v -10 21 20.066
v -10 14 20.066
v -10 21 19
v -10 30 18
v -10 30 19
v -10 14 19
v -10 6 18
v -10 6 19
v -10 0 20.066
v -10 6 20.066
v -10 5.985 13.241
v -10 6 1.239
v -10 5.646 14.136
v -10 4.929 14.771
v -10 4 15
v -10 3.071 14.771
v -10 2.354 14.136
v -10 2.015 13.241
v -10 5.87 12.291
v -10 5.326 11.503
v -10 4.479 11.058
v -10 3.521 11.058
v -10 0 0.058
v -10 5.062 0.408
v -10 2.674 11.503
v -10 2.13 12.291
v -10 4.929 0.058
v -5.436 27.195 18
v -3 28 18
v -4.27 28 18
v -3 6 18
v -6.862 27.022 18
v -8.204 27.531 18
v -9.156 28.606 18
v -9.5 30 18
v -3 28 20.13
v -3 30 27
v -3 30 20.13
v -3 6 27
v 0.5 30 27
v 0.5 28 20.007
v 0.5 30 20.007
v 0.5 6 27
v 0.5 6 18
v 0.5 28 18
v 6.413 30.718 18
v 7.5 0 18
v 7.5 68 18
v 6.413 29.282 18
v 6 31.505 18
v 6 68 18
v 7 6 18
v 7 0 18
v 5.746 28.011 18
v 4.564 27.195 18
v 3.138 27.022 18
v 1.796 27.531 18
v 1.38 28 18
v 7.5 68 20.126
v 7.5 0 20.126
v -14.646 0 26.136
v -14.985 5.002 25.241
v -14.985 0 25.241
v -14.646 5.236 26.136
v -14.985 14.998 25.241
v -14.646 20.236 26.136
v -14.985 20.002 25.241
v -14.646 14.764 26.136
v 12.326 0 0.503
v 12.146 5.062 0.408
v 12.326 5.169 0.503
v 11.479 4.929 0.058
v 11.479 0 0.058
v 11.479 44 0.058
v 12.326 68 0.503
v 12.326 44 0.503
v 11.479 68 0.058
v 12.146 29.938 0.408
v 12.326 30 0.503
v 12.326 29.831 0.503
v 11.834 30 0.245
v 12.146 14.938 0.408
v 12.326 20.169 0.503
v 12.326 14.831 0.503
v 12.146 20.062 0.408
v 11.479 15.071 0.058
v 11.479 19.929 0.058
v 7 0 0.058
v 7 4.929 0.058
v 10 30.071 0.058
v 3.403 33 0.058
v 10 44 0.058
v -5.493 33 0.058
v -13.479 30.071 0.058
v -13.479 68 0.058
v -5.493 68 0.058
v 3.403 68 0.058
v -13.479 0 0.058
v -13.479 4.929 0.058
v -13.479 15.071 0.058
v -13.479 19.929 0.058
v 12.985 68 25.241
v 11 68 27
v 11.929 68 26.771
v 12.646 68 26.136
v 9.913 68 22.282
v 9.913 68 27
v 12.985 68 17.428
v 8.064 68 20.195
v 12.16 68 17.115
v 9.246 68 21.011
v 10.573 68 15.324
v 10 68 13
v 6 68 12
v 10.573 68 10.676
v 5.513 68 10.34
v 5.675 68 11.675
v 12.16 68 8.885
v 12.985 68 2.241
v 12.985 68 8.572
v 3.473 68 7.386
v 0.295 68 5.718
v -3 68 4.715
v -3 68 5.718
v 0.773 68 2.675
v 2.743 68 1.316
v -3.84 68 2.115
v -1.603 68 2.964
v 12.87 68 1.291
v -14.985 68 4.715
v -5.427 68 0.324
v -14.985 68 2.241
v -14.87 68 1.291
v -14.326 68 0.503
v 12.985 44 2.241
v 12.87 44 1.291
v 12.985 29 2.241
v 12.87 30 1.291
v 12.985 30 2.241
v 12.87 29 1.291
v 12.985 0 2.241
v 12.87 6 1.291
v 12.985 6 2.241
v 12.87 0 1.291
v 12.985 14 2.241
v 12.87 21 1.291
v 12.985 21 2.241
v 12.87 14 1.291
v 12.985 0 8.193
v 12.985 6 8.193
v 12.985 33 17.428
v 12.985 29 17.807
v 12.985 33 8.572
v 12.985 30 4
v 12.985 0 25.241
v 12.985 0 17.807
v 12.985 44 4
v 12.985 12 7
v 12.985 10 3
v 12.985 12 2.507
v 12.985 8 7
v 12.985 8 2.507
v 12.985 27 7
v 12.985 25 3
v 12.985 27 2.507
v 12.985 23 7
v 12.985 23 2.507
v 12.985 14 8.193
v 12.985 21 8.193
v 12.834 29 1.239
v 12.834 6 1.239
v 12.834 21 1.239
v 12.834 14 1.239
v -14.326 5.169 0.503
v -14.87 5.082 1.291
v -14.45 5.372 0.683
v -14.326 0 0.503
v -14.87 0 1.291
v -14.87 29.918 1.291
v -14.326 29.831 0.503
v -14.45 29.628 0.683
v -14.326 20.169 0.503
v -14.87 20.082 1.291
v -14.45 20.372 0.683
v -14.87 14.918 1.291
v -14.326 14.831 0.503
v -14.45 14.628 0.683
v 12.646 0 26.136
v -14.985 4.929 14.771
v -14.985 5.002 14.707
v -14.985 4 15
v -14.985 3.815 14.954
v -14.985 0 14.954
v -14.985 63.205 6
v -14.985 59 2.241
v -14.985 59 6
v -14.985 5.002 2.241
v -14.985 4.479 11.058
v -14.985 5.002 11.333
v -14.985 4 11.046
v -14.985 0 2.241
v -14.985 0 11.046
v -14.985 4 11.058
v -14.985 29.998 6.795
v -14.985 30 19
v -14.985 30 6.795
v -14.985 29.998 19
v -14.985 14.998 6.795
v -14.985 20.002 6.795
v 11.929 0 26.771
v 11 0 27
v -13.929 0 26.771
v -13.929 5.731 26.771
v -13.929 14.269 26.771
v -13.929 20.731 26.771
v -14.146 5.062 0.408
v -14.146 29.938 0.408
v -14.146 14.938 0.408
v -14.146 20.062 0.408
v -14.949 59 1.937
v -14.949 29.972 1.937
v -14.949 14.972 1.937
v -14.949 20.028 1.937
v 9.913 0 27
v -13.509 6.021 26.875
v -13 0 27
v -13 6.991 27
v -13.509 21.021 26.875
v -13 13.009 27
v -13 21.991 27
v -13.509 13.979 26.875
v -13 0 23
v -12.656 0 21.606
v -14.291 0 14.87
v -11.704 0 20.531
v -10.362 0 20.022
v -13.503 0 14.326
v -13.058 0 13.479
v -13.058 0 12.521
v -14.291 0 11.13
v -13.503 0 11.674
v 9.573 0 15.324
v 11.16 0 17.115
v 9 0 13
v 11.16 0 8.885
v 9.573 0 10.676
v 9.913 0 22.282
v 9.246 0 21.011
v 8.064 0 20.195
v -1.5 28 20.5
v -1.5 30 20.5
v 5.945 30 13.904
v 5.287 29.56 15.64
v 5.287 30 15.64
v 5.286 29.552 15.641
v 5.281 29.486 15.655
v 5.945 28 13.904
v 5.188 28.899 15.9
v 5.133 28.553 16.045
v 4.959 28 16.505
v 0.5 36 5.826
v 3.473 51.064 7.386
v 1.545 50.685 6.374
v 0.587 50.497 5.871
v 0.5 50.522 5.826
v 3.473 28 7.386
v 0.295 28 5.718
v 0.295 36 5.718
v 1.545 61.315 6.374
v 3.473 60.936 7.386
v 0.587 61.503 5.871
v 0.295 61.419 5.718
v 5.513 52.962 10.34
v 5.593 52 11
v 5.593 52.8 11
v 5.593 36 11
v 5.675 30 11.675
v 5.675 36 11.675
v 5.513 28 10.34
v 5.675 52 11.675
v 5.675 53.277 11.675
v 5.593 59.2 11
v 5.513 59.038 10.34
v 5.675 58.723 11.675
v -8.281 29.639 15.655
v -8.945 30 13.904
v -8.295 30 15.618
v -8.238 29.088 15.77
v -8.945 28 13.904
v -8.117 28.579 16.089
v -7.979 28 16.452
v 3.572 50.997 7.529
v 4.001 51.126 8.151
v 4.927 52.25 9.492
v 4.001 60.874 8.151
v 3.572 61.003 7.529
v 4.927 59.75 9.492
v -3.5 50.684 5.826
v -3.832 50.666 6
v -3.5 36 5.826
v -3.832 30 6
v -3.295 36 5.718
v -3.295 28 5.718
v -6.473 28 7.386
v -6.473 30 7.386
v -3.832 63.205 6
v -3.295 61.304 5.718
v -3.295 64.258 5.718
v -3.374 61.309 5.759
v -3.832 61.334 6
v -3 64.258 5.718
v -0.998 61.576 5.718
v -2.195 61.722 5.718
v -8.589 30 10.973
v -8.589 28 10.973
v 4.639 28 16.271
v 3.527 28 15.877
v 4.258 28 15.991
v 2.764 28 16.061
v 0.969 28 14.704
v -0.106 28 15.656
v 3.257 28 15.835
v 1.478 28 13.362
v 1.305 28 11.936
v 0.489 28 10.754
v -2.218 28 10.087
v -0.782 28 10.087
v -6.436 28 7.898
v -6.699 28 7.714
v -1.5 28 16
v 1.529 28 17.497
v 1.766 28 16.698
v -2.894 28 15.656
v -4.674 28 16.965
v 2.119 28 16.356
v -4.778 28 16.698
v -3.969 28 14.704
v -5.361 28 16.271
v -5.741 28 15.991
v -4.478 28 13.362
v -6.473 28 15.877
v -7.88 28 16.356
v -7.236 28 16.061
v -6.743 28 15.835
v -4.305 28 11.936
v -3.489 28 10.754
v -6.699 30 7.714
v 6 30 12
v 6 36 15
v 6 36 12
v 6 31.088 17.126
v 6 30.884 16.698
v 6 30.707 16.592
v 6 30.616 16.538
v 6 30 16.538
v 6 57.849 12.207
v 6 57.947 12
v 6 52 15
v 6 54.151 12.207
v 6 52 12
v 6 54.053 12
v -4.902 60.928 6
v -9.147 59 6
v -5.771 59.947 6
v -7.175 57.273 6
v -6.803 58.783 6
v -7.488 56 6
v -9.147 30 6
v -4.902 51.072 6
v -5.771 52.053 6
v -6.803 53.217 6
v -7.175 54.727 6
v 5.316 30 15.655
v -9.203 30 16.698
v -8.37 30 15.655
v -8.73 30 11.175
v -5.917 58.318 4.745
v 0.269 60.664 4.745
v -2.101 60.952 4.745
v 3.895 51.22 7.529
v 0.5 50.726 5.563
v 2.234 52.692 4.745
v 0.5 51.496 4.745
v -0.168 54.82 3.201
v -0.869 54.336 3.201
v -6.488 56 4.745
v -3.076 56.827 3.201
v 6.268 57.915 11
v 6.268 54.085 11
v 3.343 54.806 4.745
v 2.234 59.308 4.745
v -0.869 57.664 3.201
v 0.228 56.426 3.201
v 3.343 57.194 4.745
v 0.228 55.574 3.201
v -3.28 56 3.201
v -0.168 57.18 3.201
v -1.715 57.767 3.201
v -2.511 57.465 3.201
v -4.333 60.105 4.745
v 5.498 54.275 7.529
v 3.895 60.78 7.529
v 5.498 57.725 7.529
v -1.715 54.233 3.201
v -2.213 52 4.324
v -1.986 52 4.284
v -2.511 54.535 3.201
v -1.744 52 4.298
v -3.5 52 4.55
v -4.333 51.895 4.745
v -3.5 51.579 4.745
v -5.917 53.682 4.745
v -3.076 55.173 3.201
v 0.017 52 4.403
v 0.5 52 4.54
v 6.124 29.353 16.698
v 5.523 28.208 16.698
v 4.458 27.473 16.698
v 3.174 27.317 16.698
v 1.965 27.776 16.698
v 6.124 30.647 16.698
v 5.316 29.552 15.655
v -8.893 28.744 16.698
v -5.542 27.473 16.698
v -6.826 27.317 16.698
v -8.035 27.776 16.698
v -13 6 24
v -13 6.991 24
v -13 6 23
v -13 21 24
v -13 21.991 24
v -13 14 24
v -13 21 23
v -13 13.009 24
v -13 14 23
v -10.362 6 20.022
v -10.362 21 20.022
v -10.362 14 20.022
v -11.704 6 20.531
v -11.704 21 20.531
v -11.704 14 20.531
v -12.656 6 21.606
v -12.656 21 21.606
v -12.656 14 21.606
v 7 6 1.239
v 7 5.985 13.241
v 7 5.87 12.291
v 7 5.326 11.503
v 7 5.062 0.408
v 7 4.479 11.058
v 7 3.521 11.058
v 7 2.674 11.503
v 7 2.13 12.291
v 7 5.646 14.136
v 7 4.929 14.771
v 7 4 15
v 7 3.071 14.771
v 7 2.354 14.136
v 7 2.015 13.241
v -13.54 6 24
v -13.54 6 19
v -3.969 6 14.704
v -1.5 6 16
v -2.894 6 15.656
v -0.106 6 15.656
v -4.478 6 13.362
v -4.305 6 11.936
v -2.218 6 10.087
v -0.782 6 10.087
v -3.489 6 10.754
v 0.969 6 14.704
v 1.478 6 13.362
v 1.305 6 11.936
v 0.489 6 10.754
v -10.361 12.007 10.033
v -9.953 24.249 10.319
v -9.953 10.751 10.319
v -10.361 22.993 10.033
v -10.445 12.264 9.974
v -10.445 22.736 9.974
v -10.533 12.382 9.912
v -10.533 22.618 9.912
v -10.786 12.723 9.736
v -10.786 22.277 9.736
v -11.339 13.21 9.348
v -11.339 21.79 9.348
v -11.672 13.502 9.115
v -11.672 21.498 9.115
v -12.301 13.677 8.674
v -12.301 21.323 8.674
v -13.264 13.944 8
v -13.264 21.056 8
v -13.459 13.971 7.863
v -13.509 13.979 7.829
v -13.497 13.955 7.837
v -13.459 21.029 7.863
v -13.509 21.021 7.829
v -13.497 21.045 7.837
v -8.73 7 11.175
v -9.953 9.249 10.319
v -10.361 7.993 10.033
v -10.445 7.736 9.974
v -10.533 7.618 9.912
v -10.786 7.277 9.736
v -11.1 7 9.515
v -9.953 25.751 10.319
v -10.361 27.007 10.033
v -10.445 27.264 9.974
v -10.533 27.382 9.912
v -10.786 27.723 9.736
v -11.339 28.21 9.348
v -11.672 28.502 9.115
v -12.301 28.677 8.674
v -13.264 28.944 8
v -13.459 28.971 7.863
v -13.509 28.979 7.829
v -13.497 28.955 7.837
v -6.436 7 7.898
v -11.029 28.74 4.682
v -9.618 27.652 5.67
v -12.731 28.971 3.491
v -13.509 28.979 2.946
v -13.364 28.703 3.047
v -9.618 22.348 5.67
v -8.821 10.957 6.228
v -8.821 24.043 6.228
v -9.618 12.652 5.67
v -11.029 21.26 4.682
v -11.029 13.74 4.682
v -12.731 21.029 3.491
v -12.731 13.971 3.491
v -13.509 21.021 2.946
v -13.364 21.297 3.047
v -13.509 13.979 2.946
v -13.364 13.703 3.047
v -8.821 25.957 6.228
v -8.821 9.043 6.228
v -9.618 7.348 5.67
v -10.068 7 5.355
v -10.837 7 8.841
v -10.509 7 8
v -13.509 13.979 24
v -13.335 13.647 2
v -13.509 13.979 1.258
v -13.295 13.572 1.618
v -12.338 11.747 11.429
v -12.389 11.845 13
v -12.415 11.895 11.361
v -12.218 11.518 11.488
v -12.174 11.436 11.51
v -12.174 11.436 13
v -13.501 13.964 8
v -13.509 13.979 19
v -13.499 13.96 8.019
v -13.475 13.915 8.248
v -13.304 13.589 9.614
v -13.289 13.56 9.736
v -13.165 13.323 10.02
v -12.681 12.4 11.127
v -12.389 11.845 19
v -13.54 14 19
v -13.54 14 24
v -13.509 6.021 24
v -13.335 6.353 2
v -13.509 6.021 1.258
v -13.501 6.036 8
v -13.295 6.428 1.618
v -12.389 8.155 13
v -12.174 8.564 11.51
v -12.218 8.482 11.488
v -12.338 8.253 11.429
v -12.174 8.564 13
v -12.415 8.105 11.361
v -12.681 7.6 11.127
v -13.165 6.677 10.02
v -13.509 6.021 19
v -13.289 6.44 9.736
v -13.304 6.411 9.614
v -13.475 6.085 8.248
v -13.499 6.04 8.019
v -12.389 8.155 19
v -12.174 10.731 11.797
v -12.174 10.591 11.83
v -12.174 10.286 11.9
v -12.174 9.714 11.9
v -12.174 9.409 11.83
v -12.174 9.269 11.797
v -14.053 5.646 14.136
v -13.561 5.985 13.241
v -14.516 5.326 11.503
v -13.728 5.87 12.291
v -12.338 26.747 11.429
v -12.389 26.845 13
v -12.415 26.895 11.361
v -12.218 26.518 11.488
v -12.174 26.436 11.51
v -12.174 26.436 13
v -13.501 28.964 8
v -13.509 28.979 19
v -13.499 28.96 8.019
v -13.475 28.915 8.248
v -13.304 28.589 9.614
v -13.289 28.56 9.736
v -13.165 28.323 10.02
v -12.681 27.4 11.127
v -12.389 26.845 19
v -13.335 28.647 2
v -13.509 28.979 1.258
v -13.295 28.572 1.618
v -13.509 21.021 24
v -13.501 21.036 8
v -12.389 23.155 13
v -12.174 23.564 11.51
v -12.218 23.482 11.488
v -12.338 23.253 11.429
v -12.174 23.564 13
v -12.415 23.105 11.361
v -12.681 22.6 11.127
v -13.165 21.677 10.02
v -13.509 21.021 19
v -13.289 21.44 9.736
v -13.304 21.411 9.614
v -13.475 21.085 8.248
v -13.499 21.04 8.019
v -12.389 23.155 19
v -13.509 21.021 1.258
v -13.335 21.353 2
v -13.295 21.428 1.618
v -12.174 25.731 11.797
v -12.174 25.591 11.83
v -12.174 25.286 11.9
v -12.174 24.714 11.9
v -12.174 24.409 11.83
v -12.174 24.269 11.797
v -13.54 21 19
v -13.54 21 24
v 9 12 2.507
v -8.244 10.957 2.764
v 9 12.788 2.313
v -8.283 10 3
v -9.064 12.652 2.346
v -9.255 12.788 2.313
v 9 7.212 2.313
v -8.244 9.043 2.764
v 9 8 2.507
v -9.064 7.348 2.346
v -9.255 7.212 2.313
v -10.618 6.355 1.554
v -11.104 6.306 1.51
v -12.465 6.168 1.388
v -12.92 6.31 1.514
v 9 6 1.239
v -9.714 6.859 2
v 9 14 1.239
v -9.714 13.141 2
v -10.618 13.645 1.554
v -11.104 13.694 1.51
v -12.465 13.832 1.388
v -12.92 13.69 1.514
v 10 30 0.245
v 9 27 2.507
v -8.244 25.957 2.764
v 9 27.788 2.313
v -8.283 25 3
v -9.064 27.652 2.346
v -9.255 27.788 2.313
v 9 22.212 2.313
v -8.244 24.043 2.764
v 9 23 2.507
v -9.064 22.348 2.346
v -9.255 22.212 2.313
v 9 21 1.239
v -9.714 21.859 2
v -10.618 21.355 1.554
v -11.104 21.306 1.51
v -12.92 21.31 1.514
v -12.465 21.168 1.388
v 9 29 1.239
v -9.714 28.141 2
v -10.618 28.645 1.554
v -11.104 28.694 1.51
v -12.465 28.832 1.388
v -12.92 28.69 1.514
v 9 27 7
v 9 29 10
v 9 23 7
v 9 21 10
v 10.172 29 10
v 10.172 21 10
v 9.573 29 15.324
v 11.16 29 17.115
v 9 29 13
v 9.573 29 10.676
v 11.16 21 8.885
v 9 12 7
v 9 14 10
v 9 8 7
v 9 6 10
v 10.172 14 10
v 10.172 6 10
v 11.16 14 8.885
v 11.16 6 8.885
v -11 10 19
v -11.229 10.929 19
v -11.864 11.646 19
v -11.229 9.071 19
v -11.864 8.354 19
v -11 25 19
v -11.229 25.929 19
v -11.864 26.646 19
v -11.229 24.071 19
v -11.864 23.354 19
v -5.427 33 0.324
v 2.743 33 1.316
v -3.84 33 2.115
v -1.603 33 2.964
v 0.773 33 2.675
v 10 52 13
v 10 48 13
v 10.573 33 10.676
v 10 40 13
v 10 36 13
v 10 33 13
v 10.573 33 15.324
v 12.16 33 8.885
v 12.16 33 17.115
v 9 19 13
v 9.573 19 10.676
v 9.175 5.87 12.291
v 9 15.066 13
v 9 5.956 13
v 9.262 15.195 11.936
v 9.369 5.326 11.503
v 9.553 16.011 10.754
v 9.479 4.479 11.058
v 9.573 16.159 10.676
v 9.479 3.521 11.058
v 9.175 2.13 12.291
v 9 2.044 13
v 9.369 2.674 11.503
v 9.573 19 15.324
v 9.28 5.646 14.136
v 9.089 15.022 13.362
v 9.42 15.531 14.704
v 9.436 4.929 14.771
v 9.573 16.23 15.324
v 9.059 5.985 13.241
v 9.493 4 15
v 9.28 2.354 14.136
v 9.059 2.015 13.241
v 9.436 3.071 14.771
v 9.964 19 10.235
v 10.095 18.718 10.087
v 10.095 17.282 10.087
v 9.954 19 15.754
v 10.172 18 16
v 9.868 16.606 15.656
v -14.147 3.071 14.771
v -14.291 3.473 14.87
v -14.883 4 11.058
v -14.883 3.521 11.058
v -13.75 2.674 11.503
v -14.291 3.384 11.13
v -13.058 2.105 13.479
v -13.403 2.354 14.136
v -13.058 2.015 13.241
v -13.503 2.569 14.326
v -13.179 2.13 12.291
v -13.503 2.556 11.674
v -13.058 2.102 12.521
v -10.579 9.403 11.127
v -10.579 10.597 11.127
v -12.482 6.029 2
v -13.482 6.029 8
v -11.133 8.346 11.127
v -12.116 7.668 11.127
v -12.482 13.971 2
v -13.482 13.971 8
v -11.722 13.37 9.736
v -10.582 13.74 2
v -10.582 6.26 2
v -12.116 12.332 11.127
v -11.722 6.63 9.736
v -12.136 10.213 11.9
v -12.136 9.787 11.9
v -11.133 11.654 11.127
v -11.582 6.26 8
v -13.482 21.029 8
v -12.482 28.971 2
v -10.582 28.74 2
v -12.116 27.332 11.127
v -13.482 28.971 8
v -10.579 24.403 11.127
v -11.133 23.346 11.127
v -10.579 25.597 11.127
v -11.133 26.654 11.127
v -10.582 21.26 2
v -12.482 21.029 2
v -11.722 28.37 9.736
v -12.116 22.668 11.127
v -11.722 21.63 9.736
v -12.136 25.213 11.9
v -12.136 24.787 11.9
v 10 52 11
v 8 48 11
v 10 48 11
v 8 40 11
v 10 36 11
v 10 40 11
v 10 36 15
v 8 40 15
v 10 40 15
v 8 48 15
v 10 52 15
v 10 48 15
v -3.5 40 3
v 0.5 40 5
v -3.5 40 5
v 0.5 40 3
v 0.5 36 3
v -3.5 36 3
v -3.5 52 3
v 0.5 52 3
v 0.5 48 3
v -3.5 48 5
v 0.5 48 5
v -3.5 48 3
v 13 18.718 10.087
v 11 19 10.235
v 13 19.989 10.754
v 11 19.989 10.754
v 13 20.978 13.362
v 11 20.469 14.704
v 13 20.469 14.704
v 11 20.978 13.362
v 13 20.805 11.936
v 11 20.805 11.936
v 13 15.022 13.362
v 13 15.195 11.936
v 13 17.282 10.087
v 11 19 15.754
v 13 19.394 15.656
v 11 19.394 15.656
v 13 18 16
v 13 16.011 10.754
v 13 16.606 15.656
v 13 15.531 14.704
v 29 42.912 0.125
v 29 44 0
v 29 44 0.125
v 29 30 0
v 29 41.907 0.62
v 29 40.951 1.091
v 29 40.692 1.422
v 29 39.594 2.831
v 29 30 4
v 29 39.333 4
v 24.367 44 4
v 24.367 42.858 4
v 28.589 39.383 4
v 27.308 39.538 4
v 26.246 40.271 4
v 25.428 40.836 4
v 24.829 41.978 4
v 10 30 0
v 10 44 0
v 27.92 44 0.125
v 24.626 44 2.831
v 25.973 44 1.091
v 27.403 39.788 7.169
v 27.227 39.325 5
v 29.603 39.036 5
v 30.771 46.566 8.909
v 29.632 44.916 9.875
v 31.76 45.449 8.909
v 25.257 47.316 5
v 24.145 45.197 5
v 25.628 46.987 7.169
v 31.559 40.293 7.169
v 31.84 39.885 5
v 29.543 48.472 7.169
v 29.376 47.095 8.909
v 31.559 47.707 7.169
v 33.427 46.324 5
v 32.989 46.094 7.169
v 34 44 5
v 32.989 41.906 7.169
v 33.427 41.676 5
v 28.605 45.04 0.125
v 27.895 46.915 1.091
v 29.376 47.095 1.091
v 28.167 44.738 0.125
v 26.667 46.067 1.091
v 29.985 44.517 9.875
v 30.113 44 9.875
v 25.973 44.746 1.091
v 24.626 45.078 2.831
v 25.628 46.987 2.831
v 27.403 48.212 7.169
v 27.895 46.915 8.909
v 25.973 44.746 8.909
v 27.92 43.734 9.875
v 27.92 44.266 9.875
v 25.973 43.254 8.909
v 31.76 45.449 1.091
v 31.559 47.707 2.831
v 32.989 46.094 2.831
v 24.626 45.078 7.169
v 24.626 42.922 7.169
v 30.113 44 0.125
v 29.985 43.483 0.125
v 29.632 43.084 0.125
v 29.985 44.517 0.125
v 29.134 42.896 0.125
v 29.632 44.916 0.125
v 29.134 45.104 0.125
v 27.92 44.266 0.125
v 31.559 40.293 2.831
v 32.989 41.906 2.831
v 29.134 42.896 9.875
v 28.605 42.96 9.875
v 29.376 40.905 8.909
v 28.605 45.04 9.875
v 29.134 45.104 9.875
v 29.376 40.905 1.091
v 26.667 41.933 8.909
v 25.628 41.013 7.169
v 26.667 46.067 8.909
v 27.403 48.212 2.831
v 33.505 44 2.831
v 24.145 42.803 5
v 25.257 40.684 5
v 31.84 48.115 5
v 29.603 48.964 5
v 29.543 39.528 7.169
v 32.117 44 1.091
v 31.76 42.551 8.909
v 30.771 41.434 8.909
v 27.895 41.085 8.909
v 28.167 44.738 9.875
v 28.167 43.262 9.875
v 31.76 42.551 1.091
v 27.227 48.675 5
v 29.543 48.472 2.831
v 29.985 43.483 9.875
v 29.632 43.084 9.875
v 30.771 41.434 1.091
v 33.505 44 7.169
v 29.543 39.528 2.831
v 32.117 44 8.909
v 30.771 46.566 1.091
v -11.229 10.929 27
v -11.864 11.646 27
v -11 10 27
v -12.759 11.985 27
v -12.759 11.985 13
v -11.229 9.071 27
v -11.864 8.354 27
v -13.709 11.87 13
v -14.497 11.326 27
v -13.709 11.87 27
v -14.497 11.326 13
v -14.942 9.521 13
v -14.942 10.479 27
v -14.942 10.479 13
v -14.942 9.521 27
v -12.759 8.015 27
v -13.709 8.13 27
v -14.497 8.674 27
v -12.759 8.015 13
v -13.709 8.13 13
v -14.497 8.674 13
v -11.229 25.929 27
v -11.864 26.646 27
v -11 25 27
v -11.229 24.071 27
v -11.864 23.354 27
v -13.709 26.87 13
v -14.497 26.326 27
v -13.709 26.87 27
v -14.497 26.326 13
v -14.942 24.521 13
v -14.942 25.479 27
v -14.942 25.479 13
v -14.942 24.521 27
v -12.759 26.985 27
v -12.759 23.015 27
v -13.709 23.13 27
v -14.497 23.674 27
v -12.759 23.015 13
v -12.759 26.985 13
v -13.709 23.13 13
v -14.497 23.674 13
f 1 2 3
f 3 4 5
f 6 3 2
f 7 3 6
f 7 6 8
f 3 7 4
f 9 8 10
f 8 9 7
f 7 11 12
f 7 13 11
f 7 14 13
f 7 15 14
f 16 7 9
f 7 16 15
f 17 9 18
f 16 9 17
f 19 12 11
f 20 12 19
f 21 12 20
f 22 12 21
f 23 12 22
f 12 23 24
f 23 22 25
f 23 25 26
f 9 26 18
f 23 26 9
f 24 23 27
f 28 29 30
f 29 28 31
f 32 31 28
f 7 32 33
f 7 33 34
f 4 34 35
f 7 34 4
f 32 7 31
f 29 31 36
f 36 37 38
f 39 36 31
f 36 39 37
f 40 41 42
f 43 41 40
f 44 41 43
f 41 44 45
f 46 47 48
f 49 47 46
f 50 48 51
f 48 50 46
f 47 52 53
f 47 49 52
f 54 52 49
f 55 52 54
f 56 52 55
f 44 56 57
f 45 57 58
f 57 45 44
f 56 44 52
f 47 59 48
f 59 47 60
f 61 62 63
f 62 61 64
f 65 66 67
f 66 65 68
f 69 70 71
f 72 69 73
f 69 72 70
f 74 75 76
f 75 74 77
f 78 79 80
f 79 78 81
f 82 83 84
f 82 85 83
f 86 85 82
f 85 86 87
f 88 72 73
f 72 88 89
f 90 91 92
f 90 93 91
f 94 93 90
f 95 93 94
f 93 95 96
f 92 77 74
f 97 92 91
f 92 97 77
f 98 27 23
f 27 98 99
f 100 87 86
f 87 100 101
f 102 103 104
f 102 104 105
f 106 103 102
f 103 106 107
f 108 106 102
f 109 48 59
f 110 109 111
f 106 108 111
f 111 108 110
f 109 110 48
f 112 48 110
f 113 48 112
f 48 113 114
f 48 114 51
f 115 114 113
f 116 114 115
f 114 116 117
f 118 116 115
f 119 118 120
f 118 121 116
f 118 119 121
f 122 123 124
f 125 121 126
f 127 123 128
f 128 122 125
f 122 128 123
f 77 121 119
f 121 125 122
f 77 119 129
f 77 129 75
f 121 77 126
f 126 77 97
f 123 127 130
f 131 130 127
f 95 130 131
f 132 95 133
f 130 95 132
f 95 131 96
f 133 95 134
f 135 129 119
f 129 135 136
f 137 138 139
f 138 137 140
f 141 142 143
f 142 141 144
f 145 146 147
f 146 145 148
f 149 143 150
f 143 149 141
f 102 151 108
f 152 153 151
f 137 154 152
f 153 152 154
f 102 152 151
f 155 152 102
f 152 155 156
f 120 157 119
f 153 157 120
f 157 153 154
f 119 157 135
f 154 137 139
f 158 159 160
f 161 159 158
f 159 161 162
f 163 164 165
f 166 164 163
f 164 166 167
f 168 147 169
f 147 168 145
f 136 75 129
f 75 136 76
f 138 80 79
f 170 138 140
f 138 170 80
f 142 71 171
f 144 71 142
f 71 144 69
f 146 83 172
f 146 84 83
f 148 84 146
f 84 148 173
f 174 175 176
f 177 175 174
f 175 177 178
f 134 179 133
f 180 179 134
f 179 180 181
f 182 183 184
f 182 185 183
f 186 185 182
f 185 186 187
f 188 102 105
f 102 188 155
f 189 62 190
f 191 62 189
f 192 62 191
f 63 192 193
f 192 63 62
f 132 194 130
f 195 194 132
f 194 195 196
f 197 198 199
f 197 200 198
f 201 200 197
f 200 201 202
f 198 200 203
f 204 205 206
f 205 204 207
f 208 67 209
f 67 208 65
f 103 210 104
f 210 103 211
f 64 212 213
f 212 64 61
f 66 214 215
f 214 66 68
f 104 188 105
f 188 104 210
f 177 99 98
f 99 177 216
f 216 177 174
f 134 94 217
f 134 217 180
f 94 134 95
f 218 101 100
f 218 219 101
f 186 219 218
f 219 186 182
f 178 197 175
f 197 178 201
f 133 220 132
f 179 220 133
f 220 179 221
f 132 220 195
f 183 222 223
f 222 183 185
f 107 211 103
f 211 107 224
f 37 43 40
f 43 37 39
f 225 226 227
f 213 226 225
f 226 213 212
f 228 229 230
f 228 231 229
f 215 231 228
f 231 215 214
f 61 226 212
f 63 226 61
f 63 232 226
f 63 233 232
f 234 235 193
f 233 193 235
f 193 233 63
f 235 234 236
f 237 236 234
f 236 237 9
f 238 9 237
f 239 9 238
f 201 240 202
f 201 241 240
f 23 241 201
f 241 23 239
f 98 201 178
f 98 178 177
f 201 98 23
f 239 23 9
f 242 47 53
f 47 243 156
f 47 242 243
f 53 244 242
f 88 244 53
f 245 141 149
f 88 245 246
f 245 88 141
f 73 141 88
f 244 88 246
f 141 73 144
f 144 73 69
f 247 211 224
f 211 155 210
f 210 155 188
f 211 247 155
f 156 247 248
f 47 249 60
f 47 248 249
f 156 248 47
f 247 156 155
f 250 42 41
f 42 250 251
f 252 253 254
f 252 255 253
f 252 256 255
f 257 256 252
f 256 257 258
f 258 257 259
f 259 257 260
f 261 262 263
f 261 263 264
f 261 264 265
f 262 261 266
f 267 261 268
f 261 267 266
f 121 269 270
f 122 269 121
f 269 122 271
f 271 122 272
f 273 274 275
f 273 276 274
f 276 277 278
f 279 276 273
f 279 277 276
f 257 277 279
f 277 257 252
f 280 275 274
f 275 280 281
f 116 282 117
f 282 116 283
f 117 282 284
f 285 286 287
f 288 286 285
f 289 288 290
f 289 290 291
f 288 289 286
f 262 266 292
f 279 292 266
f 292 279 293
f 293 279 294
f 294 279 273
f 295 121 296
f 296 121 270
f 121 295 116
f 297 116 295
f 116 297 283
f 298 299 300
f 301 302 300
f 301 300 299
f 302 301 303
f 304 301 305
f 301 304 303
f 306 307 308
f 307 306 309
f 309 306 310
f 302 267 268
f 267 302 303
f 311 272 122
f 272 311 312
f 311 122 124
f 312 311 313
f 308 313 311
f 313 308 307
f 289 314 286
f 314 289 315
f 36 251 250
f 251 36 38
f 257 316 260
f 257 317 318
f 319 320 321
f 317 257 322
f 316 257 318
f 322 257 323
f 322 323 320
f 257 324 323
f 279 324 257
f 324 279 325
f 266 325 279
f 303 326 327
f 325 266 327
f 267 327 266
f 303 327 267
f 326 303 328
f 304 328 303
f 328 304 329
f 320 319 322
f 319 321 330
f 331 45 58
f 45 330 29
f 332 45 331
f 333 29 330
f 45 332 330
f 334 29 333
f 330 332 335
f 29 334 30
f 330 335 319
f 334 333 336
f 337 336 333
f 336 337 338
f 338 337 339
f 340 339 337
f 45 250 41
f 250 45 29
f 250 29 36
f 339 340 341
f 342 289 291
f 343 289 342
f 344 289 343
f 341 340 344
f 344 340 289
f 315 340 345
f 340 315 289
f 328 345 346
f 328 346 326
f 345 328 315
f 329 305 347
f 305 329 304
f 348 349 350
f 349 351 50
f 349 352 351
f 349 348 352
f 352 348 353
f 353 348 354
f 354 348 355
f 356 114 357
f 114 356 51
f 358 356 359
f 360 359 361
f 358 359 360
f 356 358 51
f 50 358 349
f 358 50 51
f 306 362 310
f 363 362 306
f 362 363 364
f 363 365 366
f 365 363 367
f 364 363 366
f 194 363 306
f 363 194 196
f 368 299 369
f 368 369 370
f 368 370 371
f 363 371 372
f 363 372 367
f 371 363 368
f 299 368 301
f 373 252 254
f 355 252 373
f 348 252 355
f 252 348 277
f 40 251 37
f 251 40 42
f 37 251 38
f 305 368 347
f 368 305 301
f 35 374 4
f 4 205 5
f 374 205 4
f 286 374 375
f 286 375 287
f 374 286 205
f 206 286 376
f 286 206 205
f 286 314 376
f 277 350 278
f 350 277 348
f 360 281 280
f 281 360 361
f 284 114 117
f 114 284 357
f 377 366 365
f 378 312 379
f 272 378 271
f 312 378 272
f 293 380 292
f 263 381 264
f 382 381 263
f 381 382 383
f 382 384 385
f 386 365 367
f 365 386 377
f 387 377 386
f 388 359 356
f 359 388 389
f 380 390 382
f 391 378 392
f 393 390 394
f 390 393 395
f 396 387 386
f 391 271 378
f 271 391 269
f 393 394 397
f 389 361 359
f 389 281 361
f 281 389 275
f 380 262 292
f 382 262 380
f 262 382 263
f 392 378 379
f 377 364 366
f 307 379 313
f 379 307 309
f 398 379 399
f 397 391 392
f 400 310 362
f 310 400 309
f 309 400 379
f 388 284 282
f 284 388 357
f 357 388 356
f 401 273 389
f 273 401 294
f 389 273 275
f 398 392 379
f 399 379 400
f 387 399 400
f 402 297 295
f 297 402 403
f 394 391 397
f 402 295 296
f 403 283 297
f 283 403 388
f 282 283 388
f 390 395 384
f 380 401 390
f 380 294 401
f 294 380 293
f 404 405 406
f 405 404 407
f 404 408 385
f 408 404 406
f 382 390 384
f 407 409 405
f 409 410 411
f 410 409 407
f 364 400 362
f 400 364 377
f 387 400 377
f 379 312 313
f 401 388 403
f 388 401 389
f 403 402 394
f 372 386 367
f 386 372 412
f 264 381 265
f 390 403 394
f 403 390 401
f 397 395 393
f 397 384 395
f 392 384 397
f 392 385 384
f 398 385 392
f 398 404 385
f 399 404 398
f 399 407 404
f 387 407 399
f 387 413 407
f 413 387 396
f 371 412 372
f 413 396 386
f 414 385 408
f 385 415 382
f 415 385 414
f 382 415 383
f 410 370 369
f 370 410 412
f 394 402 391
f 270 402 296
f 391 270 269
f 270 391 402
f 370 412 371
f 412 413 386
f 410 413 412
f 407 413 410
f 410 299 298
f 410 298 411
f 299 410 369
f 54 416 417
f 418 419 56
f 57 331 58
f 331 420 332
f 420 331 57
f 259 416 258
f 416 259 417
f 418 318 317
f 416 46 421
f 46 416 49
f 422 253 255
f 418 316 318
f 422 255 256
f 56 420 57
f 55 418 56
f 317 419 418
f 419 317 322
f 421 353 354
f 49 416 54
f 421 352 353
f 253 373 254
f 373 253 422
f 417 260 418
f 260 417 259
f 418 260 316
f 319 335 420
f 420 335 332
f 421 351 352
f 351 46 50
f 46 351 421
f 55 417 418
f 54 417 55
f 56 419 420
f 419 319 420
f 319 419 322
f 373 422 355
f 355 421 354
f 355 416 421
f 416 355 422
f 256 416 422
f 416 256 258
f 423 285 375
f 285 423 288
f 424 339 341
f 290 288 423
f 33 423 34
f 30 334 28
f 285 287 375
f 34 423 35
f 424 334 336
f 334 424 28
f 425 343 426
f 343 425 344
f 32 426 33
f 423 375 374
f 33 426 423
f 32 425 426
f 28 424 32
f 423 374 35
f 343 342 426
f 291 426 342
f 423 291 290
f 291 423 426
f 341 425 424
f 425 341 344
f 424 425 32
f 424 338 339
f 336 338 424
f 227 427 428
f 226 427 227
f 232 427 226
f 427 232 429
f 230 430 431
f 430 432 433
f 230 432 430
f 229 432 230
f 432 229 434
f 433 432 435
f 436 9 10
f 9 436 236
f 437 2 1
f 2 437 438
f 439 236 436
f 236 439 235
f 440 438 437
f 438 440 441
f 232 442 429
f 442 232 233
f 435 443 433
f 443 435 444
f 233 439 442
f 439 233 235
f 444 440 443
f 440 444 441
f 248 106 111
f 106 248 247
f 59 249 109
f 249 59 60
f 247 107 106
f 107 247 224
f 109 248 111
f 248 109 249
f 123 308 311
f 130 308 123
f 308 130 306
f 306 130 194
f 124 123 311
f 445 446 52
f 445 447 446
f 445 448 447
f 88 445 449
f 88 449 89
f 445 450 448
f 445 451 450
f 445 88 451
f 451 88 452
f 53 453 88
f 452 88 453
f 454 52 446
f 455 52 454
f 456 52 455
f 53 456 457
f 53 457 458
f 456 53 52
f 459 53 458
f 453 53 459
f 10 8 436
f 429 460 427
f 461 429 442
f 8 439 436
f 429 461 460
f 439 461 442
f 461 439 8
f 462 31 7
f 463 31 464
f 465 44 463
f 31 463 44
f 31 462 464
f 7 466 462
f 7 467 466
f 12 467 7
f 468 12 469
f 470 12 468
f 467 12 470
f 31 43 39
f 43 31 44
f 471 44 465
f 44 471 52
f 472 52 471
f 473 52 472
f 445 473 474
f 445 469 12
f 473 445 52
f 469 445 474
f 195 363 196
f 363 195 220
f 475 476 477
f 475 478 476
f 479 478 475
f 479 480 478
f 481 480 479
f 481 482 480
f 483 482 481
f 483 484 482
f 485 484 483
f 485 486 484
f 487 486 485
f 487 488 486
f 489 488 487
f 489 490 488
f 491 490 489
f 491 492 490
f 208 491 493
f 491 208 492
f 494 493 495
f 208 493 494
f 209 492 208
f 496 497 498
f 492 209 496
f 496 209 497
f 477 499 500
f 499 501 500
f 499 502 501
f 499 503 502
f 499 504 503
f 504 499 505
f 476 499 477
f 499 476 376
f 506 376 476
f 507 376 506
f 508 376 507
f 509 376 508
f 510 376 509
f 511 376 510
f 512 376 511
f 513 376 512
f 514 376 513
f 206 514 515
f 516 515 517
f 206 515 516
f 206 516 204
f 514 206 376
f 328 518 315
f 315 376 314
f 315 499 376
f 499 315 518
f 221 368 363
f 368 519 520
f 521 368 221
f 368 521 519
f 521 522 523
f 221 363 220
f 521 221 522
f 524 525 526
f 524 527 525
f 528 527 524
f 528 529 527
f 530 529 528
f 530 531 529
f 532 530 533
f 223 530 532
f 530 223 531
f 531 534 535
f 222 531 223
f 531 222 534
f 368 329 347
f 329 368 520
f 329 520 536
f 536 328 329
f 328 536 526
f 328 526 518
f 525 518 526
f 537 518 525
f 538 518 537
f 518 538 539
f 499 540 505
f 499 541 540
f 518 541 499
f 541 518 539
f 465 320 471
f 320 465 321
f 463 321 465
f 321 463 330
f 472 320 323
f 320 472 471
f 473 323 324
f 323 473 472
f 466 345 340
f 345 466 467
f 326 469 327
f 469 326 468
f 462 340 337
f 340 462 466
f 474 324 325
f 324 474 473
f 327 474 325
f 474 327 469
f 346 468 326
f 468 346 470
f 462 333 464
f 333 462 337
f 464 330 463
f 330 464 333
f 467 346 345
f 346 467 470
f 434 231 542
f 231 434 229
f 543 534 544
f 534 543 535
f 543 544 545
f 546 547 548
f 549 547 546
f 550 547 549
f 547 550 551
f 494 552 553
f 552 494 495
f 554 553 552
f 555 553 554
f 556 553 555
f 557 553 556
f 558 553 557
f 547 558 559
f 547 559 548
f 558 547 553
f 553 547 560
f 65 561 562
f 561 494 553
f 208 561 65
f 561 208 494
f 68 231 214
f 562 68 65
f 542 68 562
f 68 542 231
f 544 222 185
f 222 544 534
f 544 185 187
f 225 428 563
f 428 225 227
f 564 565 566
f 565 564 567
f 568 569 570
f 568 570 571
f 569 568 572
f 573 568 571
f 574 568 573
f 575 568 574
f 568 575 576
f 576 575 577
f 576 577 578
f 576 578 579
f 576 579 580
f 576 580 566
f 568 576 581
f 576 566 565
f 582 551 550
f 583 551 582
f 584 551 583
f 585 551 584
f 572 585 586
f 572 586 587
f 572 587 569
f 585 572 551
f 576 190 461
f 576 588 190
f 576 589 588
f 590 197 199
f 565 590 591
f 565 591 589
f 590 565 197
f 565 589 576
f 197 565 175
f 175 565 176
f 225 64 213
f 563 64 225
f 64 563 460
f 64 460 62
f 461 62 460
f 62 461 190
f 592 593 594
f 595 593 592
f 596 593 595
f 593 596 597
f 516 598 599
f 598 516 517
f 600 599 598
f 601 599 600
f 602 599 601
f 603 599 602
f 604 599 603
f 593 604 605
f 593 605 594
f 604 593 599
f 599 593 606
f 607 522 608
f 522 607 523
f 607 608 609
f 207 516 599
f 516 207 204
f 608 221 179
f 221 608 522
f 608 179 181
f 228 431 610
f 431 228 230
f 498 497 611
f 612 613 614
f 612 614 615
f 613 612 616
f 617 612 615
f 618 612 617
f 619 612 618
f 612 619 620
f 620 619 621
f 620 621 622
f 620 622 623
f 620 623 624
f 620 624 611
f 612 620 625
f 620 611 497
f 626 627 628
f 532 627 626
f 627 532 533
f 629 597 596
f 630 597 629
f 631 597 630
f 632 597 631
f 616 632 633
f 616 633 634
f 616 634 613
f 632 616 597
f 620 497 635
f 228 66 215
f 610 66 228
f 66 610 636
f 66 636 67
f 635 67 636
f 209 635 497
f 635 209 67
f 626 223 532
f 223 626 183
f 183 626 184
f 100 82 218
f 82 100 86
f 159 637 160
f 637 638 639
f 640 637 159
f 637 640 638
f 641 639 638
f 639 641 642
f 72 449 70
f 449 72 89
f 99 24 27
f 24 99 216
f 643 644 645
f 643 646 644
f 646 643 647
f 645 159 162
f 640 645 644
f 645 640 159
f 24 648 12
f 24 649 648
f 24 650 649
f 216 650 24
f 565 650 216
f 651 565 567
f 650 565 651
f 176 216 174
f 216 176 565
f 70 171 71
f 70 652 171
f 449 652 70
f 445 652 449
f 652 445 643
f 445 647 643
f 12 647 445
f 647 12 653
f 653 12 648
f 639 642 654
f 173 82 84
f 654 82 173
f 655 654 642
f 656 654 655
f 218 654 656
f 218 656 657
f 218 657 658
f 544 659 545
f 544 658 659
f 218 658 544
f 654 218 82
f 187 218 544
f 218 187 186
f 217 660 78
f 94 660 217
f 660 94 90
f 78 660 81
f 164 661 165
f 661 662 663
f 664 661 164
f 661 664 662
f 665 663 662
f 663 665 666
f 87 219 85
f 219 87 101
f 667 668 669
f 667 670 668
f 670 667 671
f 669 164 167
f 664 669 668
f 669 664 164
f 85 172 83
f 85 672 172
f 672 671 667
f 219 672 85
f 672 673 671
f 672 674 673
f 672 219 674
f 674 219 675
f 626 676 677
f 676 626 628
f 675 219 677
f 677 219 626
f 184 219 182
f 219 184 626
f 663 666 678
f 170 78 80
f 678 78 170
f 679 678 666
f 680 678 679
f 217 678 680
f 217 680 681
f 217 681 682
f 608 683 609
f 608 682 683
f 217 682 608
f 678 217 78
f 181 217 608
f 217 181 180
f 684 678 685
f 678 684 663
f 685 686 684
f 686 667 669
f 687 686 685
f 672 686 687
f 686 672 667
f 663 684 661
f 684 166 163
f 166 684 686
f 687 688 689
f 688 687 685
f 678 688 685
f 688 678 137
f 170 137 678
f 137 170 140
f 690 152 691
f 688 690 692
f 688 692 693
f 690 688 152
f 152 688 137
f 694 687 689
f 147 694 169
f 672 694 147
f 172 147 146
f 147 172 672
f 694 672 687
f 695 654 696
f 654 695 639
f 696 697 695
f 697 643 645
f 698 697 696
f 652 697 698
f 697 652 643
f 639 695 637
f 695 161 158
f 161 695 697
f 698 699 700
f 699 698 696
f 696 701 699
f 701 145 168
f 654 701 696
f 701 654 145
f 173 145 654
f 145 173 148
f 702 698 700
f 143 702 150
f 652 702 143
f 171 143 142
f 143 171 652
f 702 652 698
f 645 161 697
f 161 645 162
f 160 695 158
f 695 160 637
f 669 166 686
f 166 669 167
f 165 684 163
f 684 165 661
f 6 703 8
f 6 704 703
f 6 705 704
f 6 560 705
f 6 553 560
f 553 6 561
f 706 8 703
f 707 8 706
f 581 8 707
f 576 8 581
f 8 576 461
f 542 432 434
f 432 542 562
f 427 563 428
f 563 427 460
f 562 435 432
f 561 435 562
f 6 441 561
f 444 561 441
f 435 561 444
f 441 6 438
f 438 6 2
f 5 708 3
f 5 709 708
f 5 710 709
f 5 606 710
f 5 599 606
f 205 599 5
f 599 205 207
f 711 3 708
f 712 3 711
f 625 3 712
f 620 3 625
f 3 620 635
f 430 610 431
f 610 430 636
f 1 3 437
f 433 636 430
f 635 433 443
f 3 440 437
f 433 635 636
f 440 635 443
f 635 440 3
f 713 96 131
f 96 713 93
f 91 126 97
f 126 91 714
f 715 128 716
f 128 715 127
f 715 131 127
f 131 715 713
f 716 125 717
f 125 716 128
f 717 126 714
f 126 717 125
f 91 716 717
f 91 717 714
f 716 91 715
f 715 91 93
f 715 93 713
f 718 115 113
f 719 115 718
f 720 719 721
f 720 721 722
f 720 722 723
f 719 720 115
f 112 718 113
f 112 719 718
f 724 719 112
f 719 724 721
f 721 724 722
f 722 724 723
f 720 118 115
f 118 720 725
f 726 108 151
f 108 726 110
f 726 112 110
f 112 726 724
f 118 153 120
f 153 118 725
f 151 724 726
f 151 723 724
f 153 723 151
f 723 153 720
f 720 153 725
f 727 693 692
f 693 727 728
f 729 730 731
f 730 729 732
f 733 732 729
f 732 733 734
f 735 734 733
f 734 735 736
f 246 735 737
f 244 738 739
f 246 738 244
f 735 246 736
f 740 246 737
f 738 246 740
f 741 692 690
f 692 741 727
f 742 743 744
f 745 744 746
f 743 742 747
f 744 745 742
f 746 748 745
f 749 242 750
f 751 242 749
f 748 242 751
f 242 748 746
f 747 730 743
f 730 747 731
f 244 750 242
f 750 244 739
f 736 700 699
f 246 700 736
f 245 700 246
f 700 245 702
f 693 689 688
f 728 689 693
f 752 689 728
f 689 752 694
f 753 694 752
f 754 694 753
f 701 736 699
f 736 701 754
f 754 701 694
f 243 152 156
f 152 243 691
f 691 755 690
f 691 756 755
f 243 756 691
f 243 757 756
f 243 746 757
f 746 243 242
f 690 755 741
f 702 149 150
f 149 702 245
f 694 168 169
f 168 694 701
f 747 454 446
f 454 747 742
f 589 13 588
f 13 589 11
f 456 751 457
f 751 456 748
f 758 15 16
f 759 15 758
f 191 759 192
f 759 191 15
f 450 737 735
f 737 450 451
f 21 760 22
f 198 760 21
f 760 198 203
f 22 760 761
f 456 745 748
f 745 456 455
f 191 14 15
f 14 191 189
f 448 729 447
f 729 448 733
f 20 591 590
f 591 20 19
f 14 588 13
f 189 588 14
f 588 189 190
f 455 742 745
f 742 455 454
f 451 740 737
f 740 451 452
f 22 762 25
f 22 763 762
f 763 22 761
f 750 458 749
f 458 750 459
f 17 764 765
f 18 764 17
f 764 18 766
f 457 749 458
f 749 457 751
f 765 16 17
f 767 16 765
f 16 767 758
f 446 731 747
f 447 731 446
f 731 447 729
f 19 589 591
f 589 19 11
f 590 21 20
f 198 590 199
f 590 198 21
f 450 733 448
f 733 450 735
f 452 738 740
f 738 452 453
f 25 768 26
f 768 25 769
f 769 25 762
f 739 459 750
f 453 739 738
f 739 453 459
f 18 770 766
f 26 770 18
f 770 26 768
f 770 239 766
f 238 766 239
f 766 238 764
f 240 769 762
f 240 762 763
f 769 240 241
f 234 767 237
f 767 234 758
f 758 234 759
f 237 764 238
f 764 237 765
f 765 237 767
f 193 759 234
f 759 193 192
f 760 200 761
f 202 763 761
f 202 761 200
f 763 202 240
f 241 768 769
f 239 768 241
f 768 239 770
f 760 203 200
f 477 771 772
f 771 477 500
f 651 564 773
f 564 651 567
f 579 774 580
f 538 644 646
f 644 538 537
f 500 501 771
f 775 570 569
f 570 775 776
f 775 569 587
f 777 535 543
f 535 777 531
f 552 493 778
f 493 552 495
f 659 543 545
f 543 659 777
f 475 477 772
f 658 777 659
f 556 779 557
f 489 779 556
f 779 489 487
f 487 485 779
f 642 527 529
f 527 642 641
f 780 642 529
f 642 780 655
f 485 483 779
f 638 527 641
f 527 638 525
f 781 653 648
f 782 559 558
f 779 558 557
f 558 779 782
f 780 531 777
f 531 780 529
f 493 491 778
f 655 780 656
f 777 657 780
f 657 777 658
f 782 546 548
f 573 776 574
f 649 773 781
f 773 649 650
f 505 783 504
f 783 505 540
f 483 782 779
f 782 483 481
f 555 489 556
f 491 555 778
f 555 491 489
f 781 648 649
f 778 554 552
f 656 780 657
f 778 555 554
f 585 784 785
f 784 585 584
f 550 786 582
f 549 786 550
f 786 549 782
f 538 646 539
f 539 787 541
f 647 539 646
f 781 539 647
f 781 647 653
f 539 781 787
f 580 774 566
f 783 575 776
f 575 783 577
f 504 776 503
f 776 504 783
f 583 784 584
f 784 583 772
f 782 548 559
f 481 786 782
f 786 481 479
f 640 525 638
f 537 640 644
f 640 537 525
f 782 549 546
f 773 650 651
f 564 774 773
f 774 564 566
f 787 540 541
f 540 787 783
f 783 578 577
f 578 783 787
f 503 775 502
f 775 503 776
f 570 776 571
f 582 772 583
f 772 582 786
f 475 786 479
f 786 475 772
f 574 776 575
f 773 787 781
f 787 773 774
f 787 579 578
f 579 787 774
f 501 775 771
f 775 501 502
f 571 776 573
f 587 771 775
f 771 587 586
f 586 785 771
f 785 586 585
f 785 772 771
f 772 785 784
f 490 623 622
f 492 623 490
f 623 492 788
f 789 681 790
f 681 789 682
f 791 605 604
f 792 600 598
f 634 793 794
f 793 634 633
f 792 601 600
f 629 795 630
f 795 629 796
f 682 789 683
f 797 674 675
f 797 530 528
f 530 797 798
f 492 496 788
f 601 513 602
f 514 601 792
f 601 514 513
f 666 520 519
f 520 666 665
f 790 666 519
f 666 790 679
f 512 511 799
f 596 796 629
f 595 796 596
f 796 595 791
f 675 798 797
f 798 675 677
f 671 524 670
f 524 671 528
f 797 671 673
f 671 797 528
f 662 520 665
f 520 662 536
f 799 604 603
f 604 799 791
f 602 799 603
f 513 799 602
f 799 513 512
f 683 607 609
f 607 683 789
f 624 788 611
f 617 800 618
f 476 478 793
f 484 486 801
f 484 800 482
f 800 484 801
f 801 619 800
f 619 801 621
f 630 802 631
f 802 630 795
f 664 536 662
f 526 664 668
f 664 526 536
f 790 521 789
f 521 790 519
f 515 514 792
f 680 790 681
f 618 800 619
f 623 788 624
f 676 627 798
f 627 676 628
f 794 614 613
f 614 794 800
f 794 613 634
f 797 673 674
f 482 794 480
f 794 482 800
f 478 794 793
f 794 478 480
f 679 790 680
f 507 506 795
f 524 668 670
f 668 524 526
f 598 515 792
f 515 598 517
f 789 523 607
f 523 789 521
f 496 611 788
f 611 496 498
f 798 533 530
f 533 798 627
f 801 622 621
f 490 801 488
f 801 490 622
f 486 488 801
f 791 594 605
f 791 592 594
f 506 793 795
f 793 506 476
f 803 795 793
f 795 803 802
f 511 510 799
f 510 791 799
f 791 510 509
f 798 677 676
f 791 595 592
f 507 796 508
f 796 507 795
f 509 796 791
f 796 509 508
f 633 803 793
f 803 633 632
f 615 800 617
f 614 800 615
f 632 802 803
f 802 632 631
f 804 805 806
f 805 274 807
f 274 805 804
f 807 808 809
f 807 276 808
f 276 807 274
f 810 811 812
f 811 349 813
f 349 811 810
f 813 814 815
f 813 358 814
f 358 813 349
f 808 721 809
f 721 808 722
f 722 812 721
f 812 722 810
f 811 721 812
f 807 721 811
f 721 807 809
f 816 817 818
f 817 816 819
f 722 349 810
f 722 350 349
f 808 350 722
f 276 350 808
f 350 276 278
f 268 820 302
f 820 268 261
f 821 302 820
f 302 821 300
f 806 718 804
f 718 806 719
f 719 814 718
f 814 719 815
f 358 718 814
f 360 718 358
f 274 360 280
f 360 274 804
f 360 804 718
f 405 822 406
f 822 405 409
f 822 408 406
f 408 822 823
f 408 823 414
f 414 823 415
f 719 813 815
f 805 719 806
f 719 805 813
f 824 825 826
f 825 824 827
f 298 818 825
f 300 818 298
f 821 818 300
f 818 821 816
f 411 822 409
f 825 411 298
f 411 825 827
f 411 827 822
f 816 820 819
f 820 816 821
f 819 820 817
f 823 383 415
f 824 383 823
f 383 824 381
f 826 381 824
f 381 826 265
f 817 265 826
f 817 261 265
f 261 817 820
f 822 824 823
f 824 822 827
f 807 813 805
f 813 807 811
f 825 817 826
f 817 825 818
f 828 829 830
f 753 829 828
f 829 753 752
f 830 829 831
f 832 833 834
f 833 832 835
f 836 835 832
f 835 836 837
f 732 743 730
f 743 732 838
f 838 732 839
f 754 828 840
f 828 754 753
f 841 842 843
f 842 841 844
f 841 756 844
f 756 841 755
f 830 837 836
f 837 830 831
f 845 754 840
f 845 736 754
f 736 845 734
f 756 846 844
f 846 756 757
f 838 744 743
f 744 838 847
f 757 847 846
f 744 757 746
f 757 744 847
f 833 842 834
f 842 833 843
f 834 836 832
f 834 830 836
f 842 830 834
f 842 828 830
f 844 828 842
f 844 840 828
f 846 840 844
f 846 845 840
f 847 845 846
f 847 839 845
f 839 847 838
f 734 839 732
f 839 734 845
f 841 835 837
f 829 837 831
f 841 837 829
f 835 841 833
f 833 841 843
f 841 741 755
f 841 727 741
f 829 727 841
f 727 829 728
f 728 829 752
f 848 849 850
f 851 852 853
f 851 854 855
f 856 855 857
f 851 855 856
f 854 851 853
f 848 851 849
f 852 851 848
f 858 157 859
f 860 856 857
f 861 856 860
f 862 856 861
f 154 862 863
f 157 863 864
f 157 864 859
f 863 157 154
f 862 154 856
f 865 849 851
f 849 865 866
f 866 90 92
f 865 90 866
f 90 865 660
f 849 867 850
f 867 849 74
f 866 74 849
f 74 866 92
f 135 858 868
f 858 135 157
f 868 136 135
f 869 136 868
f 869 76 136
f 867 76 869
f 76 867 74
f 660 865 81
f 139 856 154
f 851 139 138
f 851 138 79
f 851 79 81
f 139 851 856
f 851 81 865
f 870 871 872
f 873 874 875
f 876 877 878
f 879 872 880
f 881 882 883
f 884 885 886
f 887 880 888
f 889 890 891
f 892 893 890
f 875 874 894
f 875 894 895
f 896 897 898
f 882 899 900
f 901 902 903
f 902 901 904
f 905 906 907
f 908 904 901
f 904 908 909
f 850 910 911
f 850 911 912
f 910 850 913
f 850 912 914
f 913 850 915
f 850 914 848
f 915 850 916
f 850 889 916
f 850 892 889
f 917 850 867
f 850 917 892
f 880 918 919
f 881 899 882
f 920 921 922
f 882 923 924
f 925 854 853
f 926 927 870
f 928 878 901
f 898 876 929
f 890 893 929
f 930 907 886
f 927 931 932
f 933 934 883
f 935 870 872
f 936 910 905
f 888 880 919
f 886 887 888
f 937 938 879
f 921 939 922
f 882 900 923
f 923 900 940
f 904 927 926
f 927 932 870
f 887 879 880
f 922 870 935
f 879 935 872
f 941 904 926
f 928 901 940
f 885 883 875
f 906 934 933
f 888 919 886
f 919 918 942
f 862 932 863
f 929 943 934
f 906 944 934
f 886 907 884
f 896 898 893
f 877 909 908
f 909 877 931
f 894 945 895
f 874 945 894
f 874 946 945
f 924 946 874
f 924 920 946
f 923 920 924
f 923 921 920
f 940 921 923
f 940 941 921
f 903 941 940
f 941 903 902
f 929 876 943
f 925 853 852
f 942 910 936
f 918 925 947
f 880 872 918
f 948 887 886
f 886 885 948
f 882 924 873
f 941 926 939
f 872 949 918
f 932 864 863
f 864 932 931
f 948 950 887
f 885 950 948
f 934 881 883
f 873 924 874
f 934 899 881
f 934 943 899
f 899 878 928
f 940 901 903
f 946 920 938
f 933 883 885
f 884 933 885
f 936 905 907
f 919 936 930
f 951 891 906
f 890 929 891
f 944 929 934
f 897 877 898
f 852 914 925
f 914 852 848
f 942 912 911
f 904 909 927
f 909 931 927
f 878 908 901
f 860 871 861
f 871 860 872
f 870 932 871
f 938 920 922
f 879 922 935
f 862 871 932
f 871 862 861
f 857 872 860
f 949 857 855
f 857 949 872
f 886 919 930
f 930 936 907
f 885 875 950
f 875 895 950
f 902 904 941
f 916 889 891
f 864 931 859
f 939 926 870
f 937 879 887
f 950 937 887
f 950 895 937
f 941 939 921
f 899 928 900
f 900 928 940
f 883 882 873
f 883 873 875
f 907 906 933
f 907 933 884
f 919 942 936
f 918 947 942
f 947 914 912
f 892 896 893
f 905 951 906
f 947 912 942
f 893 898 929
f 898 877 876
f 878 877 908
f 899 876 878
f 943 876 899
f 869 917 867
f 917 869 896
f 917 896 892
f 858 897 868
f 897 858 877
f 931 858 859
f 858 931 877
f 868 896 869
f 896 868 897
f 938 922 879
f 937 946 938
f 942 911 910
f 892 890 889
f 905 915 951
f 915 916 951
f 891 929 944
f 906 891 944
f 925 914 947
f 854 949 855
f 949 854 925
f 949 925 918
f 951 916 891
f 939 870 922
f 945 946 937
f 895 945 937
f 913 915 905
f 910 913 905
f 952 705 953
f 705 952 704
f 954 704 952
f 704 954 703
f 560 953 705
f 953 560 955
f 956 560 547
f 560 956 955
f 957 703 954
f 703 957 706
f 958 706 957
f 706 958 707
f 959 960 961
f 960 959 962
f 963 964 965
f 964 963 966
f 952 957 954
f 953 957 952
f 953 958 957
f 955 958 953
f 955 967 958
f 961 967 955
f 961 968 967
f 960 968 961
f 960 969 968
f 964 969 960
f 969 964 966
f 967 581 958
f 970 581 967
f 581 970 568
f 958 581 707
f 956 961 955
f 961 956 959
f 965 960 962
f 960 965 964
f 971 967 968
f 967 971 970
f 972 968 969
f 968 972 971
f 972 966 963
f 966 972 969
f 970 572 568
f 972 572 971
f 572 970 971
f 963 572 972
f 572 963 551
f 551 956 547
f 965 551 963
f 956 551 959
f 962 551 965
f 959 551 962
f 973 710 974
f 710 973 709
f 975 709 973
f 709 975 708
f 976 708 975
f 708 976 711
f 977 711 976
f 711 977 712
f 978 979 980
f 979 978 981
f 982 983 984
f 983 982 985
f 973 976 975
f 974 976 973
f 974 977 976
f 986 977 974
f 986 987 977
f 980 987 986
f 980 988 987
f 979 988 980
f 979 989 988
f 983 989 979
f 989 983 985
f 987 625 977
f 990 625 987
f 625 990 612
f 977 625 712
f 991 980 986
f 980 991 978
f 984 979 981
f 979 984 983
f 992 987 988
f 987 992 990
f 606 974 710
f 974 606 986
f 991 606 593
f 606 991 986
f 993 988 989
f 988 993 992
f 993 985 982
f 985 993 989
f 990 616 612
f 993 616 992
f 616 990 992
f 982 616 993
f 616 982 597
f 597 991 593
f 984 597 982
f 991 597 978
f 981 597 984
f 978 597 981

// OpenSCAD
$fn=13;   // For persion of polygons


worldT = -23;
worldR = 180;
length = 67;

// See where things are
rotate([0,worldR,0]){
translate([0,0,worldT]){

/*

    
    
    
*/

}}





    


union(){
    /*
translate([-7,57,5]){  // apply pressure to shell.
rotate([0,90,0]){
    cylinder(r=2,h=14);
}}*/
translate([10,30,0]){  // shaft for charging handle.
cube([19,14,4]);
}
translate([29,44,5]){  // charging handle
sphere(5);
}

translate([-13,10,13]){  //rubberband holder1
    cylinder(r=2,h=14);
}
translate([-13,25,13]){  //rubberband holder2
    cylinder(r=2,h=14);
}
    
difference(){
rotate([0,worldR,0]){
translate([0,0,worldT]){
difference(){   // internal slide
translate([13,0,21]){     //brick
rotate([0,90,90]){ 
minkowski(){
    cube([23,24,length],0);
    cylinder(r=2,h=1);
}}}
rotate([0,90,90]){ // main cylinder
translate([-10,-1.5,28]){
    cylinder(50,r=7.5,7.5);
}}
hull(){   // clean loading and ejecting
translate([-6,30,-5]){
    cube([14,70,16]);
}
translate([0,30,-4]){
    cube([17,70,21],0);
}}

translate([1.5,56,12]){  // extra room for loading
sphere(8);
}

translate([-3.5,30,5]){  // extra room for easier loading
sphere(3);
}
translate([6.5,30,5]){  // extra room for easier loading
sphere(3);
}
hull(){
translate([10,50,0]){  //clipchop1
rotate(a=90, v=[1,0,0]){
    cylinder(r=3,h=60);
}}

translate([10,50,-5]){  //clipchop1
rotate(a=90, v=[1,0,0]){
    cylinder(r=3,h=60);
}}}

hull(){
translate([-7,90,0]){  //clipchop2
rotate(a=90, v=[1,0,0]){
    cylinder(r=3,h=100);
}}
translate([-7,90,-5]){  //clipchop2
rotate(a=90, v=[1,0,0]){
    cylinder(r=3,h=100);
}}}

translate([3,60,12]){ //ramp
rotate([15,0,0]){
cube([19,14,4]);
}}

translate([9,27.5,-5]){// Fix flotting block
    cube([8,8,8]);
}
translate([0,-74,-5]){  //rear hole
translate([-7,30,-3]){
    cube([17,50,35]);
}}
translate([22,7,26]){ // ejecting arm hole
rotate([0,145,0]){ 
    cube([19,52,4]);
}}
rotate([0,90,90]){ // pin hole cylinder
translate([-10,-1.5,0]){
    cylinder(90,r=3,3);
}}
translate([18,10,-4]){  //rubberband path1
    cylinder(r=6,h=30);
}
translate([18,25,-4]){  //rubberband path2
    cylinder(r=6,h=30);
}
translate([-15,10,26]){  //rubberband path3
rotate(a=90, v=[0,1,0]){
    cylinder(r=6,h=30);
}}
translate([-15,25,26]){  //rubberband path4
rotate(a=90, v=[0,1,0]){
    cylinder(r=6,h=30);
}}
translate([-15,21,13]){// Fix 1
    cube([6,8,3]);
}
translate([-15,6,13]){
    cube([6,8,3]);
}
translate([-15,6,15]){// Fix 2
    cube([6,2,15]);
}
translate([-15,12,15]){
    cube([6,2,15]);
}
translate([-15,21,15]){
    cube([6,2,15]);
}
translate([-15,27,15]){
    cube([6,2,15]);
}
translate([5,6,-1]){// clean surface1
    cube([15,8,5]);
}
translate([5,21,-1]){// clean surface2
    cube([15,10,5]);
}
translate([1,85,25]){  //rubberband path7
rotate(a=90, v=[1,0,0]){
    cylinder(r=5,h=52);
}}
translate([-15,75,10]){  //rubberband path8
rotate(a=90, v=[1,0,0]){
    cylinder(r=5,h=42);
}}
translate([-14,29,10]){  //rubberband path9
rotate(a=90, v=[1,0,0]){
    cylinder(r=5,h=35);
}}
translate([-15,4,10]){//rubberband striker hole
rotate(a=90, v=[0,1,0]){
    cylinder(r=2,h=35);
}}
translate([15,4,10]){//rubberband smoothing
rotate(a=90, v=[1,0,0]){
    cylinder(r=2,h=30);
}}
hull(){    // cleanup rubberband ejector1
translate([12,10,21]){
    sphere(4);
}
translate([13,10,15]){
    sphere(4);
}}
hull(){    // cleanup rubberband ejector2
translate([12,25,21]){
    sphere(4);
}
translate([13,25,15]){
    sphere(4);
}}
translate([3,0,-10]){  // plunger
cube([7,40,15]);
translate([-10.5,-2,0]){
cube([7,80,15]);
}}
}}}

// Beginning of new difference.
rotate([0,worldR,0]){
translate([0,0,worldT]){
    
translate([-10,36,8]){// this works.
    cube([10,4,4]);
}
translate([-10,48,8]){
    cube([10,4,4]);
}
translate([-.5,36,10]){
    cube([4,4,10]);
}
translate([-.5,48,10]){
    cube([4,4,10]);
}
translate([-8,36,8]){  // resesses
    cube([10,16,4]);
}
translate([-.5,36,8]){
    cube([4,16,10]);
}
}}}
// This is connected to the union at the top.
rotate([0,worldR,0]){ 
translate([0,0,worldT]){
difference(){ // Pin and notch
translate([-13,18,10]){
rotate(a=90, v=[0,1,0]){
    cylinder(r=3,h=5);
}}
translate([-11,19,-4]){
    cube([2,20,21],0);
}}
}}}
